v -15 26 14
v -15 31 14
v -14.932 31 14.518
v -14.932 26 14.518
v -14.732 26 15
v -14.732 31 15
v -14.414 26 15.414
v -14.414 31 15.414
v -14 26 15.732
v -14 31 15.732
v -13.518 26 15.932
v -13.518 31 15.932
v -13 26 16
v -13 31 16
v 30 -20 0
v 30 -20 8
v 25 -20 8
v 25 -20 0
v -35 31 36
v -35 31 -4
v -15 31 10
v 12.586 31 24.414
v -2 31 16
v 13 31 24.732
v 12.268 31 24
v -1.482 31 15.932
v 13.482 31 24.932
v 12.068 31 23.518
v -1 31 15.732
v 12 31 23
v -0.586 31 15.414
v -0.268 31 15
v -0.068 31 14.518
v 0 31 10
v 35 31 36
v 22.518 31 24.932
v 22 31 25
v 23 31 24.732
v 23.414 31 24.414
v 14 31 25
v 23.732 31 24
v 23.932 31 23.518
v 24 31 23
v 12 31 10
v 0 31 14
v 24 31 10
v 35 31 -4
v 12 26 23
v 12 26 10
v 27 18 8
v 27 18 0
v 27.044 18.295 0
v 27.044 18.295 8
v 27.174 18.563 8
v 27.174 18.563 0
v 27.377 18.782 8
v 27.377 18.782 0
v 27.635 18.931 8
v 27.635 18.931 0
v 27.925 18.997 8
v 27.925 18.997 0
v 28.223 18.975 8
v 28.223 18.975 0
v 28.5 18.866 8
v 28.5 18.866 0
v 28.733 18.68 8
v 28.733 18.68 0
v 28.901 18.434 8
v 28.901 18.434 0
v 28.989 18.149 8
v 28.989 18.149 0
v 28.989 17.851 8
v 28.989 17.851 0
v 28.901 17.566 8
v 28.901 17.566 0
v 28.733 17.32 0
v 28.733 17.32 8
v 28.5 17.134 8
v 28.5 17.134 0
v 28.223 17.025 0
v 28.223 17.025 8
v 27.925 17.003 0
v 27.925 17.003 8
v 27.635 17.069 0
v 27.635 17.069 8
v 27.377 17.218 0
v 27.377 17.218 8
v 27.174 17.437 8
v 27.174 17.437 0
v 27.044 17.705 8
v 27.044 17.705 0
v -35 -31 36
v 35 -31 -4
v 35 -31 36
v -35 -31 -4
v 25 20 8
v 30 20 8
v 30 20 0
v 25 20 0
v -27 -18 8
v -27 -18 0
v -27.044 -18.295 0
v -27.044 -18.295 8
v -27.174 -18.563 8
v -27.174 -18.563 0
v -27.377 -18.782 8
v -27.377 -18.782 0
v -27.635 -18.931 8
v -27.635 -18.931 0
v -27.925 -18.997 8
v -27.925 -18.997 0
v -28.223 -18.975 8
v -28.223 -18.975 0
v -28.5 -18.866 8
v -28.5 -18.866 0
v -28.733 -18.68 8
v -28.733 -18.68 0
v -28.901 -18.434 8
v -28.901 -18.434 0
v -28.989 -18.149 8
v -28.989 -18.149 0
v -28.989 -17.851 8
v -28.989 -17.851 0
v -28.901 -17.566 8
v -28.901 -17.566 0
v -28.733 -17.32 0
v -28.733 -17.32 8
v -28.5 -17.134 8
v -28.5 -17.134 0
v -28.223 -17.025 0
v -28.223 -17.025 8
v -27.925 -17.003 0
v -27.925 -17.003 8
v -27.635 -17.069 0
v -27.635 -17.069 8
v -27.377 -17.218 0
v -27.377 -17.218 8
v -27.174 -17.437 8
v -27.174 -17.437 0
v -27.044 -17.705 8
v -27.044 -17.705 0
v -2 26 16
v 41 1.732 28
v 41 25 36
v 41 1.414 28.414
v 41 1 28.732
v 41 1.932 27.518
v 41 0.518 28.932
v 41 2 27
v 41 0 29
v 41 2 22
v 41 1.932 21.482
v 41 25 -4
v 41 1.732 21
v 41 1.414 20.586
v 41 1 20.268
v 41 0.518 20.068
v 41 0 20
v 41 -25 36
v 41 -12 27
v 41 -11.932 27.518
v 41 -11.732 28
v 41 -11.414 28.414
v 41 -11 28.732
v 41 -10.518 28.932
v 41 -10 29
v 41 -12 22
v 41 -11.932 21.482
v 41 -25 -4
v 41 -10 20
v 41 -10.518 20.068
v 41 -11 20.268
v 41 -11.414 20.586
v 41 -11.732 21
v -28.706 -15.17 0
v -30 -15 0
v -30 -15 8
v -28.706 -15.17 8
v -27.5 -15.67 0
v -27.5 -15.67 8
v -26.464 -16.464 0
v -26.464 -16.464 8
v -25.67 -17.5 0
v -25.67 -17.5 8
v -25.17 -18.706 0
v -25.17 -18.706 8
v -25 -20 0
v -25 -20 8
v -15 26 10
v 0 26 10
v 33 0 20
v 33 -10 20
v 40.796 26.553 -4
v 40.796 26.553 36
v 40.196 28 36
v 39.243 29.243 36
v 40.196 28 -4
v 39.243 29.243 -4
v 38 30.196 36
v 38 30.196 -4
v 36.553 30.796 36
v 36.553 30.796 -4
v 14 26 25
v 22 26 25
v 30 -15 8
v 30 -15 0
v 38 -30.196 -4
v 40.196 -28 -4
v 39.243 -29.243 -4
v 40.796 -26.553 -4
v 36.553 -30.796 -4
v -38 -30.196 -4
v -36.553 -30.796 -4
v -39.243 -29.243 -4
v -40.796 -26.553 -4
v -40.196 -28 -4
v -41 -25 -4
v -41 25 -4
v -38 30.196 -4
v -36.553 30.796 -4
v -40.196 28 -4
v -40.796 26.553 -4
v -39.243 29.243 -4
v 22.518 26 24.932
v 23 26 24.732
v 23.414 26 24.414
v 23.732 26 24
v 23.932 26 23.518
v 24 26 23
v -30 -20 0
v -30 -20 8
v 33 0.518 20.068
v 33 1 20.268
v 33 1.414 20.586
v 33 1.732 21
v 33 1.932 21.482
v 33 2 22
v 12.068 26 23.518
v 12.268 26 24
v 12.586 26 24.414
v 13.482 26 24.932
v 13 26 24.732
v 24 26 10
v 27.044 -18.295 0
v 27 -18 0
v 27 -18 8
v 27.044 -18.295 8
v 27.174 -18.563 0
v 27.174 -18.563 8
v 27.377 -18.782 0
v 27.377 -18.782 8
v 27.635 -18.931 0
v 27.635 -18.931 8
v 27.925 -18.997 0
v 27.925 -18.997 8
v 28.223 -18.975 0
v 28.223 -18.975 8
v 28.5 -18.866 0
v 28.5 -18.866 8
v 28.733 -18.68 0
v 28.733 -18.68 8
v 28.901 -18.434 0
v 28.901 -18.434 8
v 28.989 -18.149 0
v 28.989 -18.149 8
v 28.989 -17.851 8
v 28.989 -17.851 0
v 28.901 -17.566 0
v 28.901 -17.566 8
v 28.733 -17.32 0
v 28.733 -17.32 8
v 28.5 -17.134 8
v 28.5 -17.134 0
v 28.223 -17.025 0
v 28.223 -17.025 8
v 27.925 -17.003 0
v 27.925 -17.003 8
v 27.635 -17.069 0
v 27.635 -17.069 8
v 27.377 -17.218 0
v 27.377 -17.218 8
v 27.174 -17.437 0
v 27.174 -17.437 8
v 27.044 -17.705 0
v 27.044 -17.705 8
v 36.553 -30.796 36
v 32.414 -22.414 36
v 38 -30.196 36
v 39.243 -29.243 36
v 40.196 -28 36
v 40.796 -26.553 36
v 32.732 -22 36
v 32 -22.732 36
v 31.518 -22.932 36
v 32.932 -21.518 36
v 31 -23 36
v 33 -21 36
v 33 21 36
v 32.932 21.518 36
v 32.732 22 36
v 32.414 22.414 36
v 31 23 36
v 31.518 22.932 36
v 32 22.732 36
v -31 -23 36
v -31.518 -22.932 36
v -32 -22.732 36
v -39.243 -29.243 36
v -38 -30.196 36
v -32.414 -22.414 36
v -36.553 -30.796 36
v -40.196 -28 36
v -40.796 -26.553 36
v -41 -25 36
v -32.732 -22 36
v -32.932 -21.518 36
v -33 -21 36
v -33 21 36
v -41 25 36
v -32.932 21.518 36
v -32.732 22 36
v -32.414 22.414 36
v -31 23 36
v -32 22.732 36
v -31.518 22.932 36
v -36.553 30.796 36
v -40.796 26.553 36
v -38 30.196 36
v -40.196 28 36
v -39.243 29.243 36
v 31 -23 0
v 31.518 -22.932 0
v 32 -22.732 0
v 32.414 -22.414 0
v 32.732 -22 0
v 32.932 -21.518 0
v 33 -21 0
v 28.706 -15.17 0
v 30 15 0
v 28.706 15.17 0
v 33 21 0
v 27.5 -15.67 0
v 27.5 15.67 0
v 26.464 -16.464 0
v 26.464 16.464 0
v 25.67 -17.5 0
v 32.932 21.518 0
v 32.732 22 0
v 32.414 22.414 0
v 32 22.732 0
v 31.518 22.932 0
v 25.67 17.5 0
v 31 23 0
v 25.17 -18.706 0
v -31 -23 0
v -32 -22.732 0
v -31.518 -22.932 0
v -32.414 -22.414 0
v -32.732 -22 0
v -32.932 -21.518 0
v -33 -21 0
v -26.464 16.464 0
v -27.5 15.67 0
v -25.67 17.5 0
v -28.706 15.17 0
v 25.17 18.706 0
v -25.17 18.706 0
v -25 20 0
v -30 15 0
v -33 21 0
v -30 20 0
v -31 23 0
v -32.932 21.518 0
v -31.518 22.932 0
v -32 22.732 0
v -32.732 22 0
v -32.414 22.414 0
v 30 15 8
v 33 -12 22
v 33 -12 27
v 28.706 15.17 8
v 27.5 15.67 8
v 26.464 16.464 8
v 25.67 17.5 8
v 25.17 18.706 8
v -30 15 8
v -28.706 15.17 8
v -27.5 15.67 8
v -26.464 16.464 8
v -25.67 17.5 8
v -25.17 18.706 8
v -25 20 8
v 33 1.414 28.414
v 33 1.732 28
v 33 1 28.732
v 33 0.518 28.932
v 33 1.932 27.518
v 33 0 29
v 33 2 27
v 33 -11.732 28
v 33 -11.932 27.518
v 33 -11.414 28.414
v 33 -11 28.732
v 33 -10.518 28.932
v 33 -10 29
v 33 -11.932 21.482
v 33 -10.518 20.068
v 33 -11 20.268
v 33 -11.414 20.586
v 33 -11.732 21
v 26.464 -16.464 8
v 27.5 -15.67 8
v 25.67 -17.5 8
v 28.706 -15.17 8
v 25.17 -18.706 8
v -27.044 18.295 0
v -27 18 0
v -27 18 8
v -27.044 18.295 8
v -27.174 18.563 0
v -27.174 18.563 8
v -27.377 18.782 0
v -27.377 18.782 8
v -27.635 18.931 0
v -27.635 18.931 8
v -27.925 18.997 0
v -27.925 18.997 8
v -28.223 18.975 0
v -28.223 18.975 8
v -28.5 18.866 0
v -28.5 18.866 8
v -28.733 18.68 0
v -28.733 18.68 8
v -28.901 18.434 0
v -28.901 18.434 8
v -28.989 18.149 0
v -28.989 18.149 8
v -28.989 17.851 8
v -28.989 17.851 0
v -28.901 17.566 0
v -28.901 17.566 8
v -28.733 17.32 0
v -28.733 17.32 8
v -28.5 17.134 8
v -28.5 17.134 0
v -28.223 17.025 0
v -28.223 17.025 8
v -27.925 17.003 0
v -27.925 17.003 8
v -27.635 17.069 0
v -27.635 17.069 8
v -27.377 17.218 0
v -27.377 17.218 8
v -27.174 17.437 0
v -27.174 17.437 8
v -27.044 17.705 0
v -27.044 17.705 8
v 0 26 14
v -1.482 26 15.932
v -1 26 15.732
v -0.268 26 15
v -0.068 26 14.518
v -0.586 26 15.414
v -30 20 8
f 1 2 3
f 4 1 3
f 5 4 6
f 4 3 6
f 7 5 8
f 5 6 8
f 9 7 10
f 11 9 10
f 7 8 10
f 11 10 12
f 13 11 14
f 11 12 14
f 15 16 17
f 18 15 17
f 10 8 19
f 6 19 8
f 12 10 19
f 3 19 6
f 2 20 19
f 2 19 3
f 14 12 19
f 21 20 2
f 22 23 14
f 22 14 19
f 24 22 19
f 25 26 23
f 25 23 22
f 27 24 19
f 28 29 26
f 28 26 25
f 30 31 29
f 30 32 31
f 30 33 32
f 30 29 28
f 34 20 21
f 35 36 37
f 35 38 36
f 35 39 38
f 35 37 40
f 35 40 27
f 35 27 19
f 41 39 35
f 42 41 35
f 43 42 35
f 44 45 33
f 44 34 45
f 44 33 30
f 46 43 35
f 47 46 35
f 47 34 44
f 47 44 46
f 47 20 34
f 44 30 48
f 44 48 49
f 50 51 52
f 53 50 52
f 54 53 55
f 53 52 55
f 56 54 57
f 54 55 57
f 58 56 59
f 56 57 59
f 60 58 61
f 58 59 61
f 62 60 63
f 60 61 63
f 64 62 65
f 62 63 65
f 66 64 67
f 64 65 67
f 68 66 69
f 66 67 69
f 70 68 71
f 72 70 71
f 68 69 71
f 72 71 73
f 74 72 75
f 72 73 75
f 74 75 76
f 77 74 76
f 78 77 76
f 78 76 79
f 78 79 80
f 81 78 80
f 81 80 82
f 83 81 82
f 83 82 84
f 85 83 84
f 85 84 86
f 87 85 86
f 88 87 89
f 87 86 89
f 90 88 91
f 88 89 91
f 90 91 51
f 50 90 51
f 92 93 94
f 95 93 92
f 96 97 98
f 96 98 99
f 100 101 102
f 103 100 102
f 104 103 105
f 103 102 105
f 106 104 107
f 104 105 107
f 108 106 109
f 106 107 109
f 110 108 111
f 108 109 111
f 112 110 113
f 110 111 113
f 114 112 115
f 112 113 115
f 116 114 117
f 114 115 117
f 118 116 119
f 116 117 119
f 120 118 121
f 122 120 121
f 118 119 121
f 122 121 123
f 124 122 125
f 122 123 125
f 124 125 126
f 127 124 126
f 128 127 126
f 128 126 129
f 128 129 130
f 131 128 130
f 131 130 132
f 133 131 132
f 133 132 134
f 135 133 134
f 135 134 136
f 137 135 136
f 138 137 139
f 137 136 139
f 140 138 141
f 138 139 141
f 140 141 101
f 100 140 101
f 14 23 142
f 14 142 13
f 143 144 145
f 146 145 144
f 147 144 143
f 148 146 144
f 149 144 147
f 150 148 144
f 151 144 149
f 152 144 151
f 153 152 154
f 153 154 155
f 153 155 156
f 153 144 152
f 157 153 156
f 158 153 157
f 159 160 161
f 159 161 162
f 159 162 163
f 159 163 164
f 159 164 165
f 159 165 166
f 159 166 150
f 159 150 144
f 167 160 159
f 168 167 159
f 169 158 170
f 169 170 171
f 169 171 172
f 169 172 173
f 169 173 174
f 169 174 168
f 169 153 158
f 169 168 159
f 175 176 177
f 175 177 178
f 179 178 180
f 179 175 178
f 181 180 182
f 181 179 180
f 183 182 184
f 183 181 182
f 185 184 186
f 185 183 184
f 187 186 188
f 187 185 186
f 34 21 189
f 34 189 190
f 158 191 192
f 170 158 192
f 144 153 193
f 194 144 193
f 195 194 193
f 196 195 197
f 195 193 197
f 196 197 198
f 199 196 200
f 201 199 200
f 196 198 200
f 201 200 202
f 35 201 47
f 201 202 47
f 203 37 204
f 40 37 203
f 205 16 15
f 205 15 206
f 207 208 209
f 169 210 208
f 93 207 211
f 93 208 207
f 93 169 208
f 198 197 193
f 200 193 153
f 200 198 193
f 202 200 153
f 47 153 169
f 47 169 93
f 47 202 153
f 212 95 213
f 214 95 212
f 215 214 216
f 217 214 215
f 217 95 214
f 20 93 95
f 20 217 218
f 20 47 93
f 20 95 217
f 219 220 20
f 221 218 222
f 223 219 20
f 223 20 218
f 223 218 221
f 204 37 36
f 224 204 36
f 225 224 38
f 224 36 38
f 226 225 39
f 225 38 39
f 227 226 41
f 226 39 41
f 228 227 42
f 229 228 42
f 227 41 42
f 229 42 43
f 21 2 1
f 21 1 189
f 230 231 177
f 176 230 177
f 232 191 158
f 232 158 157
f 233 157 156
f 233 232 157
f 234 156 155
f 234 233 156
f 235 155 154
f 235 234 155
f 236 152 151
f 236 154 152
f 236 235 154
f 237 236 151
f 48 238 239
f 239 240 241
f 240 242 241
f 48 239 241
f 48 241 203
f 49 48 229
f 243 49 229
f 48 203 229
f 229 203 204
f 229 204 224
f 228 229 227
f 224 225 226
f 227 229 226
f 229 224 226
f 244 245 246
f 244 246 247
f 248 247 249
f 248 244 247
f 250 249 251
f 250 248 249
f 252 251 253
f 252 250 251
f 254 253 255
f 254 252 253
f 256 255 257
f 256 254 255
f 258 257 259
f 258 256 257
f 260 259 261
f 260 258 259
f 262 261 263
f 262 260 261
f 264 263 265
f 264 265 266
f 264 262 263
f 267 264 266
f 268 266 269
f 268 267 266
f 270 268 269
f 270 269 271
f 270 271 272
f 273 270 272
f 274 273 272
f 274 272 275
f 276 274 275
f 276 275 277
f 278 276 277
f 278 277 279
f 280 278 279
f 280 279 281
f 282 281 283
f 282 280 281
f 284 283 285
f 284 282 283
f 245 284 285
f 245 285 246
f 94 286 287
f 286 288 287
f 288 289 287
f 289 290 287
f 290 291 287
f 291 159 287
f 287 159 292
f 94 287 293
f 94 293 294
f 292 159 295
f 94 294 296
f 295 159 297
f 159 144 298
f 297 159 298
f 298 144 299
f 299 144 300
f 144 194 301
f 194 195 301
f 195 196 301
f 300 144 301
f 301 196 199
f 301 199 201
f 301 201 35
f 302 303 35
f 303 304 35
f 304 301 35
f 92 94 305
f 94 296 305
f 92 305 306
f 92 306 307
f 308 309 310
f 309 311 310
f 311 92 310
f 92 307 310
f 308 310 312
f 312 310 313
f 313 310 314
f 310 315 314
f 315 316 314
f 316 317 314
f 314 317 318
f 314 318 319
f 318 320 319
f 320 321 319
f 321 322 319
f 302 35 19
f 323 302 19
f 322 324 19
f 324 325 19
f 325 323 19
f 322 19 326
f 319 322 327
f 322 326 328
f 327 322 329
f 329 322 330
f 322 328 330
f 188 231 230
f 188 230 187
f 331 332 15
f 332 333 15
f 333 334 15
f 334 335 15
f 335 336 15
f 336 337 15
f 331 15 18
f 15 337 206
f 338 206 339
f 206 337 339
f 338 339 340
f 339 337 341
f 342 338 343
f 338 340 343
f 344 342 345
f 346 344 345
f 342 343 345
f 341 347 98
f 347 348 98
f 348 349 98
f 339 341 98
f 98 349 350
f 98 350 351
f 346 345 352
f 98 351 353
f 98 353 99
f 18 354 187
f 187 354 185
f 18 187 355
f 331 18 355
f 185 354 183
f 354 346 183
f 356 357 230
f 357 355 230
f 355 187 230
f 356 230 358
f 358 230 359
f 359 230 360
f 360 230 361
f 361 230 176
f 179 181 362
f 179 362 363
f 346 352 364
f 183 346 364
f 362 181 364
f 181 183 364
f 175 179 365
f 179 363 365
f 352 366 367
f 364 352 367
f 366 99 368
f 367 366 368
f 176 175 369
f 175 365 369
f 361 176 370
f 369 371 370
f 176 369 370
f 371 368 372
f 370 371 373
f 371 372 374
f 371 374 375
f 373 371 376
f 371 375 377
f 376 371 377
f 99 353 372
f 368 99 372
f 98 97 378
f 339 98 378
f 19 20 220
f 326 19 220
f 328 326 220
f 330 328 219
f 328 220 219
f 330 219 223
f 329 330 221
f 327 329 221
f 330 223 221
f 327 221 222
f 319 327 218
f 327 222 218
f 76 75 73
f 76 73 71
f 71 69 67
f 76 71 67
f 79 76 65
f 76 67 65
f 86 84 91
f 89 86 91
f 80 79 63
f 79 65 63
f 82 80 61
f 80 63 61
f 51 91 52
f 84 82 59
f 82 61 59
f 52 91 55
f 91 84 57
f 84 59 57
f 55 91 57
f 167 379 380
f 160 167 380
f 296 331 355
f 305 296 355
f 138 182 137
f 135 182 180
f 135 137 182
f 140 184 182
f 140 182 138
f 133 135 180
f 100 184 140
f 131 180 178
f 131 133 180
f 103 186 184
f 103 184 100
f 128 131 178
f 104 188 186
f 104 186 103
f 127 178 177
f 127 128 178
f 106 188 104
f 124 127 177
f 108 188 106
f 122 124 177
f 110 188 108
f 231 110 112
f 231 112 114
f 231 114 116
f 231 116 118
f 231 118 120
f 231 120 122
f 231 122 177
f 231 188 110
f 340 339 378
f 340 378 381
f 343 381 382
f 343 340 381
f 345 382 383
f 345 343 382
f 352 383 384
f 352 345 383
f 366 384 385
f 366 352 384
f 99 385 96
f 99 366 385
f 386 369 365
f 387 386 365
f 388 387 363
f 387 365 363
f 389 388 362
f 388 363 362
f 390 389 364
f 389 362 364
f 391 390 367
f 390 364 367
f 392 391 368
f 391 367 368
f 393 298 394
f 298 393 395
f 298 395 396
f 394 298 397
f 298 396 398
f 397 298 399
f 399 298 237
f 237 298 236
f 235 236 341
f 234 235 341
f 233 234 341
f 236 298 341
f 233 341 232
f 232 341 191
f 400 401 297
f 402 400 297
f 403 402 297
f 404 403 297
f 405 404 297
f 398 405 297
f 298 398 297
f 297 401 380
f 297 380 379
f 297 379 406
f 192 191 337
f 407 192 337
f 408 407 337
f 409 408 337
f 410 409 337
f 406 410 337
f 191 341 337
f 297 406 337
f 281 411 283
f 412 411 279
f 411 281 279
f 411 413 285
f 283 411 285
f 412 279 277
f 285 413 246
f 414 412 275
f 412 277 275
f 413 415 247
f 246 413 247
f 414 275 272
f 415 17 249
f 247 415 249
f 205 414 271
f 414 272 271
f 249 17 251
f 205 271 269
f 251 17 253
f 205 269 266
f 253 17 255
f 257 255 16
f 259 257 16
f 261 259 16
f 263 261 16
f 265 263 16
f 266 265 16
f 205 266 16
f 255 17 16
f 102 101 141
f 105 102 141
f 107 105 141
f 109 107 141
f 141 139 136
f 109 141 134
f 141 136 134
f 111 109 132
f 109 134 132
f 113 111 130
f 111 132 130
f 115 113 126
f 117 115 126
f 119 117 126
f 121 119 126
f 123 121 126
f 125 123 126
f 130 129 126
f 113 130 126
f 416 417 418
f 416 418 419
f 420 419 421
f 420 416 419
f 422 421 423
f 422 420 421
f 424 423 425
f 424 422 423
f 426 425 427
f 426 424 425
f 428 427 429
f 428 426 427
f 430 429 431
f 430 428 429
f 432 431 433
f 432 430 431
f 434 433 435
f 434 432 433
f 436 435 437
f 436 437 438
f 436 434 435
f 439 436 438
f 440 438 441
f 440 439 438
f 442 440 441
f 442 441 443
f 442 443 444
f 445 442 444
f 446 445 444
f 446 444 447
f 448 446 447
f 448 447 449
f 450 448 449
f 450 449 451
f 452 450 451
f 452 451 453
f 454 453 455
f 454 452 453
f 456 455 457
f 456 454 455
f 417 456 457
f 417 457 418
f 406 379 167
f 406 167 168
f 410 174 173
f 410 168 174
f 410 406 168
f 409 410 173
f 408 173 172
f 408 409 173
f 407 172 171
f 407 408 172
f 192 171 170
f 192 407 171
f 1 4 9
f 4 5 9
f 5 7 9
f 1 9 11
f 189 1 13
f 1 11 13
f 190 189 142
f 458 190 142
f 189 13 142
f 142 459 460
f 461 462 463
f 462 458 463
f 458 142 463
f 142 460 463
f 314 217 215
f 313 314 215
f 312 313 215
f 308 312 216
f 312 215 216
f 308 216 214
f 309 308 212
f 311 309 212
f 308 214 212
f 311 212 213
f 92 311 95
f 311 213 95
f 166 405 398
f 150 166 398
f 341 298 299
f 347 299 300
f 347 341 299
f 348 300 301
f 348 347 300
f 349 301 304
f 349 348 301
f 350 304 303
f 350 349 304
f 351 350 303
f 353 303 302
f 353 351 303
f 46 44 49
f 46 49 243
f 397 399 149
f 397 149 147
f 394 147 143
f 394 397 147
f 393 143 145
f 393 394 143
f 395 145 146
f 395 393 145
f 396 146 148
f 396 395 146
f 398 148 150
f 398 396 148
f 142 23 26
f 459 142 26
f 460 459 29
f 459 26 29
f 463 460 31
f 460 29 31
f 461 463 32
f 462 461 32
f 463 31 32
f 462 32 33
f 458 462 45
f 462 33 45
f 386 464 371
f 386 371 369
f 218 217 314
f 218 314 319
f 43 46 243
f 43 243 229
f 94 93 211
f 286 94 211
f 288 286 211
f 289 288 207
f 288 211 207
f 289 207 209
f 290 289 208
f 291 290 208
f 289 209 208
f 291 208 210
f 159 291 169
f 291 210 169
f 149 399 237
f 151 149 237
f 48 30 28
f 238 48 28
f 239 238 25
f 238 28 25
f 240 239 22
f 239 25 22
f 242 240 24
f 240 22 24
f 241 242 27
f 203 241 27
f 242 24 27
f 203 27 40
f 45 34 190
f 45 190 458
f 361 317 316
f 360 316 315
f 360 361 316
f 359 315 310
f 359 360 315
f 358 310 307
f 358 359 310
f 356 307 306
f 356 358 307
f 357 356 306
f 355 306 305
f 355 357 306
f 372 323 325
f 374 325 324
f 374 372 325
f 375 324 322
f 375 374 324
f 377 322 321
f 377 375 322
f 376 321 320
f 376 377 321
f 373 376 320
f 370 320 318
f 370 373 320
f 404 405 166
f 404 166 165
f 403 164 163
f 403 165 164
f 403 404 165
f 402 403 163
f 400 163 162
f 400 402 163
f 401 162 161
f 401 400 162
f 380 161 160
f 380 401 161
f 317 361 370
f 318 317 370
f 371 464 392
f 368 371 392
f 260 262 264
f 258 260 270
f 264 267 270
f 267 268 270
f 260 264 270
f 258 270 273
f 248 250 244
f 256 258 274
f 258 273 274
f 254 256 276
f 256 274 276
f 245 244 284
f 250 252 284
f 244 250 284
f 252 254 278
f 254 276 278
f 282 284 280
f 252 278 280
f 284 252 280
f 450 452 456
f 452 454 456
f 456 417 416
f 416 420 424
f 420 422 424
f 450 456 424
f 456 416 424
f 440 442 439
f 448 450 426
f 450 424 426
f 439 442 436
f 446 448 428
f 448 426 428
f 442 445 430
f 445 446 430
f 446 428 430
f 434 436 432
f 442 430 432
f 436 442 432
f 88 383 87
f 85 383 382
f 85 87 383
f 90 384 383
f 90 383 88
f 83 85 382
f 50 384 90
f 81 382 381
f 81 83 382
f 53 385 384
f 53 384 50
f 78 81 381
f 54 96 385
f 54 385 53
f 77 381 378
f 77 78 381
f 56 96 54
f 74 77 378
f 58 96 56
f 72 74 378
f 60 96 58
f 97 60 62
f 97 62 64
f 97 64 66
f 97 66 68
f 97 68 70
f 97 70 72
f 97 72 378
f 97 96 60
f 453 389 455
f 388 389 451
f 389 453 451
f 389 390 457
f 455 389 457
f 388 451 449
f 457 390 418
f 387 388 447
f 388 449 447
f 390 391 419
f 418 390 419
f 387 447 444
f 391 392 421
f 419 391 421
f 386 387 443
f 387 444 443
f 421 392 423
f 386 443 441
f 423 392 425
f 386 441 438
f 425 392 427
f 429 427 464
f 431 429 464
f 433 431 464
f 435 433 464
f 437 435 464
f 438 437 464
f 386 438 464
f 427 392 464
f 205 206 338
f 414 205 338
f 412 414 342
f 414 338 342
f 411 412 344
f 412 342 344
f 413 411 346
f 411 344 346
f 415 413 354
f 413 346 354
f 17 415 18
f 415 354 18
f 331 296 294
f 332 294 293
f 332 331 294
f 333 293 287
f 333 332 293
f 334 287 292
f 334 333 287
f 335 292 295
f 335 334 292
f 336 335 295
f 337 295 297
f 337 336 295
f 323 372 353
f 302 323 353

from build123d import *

# Parameters (mm, degrees)
PAD_DEPTH               = 40
POCKET_DEPTH            = 36.001
SKETCH002_R             = 1
PAD001_DEPTH            = 8
SKETCH002_MIRRORED_2_R  = 1
PAD001_MIRRORED_2_DEPTH = 8
POCKET001_DEPTH         = 41.001
POCKET002_DEPTH         = 5


with BuildPart() as part:
    # Sketch → Pad (new body)
    with BuildSketch(Plane.XY.offset(-4)):
        with BuildLine():
            Line((-35, 31), (35, 31))
            ThreePointArc((41, 25), (39.242641, 29.242641), (35, 31))
            Line((41, 25), (41, -25))
            ThreePointArc((35, -31), (39.242641, -29.242641), (41, -25))
            Line((35, -31), (-35, -31))
            ThreePointArc((-41, -25), (-39.242641, -29.242641), (-35, -31))
            Line((-41, -25), (-41, 25))
            ThreePointArc((-35, 31), (-39.242641, 29.242641), (-41, 25))
        make_face()
    extrude(amount=PAD_DEPTH)

    # Sketch001 → Pocket (cut, through all)
    with BuildSketch(Plane.XY):
        with BuildLine():
            Line((-31, 23), (31, 23))
            ThreePointArc((33, 21), (32.414214, 22.414214), (31, 23))
            Line((33, 21), (33, -21))
            ThreePointArc((31, -23), (32.414214, -22.414214), (33, -21))
            Line((31, -23), (-31, -23))
            ThreePointArc((-33, -21), (-32.414214, -22.414214), (-31, -23))
            Line((-33, -21), (-33, 21))
            ThreePointArc((-31, 23), (-32.414214, 22.414214), (-33, 21))
        make_face()
    extrude(amount=POCKET_DEPTH, mode=Mode.SUBTRACT)

    # Sketch002 → Pad001 (join)
    with BuildSketch(Plane.XY):
        with BuildLine():
            Line((-30, 20), (-25, 20))
            ThreePointArc((-30, 15), (-26.464466, 16.464466), (-25, 20))
            Line((-30, 20), (-30, 15))
        make_face()
        with Locations((-28, 18)):
            Circle(SKETCH002_R, mode=Mode.SUBTRACT)
    pad001 = extrude(amount=PAD001_DEPTH)

    # Sketch002 Mirrored 2 → Pad001 Mirrored 2 (add)
    with BuildSketch(Plane(origin=(0, 0, 0), x_dir=(-1, 0, 0), z_dir=(0, 0, -1))):
        with BuildLine():
            Line((-30, 20), (-25, 20))
            ThreePointArc((-30, 15), (-26.464466, 16.464466), (-25, 20))
            Line((-30, 20), (-30, 15))
        make_face()
        with Locations((-28, 18)):
            Circle(SKETCH002_MIRRORED_2_R, mode=Mode.SUBTRACT)
    pad001_mirrored_2 = extrude(amount=-PAD001_MIRRORED_2_DEPTH)

    # Mirrored001: Pad001, Pad001 Mirrored 2 across Sketch002 H_Axis
    add(pad001.mirror(Plane.ZX))
    add(pad001_mirrored_2.mirror(Plane.ZX))

    # Sketch003 → Pocket001 (cut, through all)
    with BuildSketch(Plane.YZ):
        with BuildLine():
            Line((0, 20), (-10, 20))
            ThreePointArc((-12, 22), (-11.414214, 20.585786), (-10, 20))
            Line((-12, 22), (-12, 27))
            ThreePointArc((-10, 29), (-11.414214, 28.414214), (-12, 27))
            Line((-10, 29), (0, 29))
            ThreePointArc((2, 27), (1.414214, 28.414214), (0, 29))
            Line((2, 27), (2, 22))
            ThreePointArc((0, 20), (1.414214, 20.585786), (2, 22))
        make_face()
    extrude(amount=POCKET001_DEPTH, mode=Mode.SUBTRACT)

    # Sketch004 (on Face7 of Pocket001) → Pocket002 (cut)
    with BuildSketch(Plane(origin=(0, 31, 0), x_dir=(-1, 0, 0), z_dir=(0, 1, 0))):
        with BuildLine():
            Line((-22, 25), (-14, 25))
            ThreePointArc((-12, 23), (-12.585786, 24.414214), (-14, 25))
            Line((-12, 23), (-12, 10))
            Line((-12, 10), (-24, 10))
            Line((-24, 10), (-24, 23))
            ThreePointArc((-22, 25), (-23.414214, 24.414214), (-24, 23))
        make_face()
        with BuildLine():
            Line((2, 16), (13, 16))
            ThreePointArc((15, 14), (14.414214, 15.414214), (13, 16))
            Line((15, 14), (15, 10))
            Line((15, 10), (0, 10))
            Line((0, 10), (0, 14))
            ThreePointArc((2, 16), (0.585786, 15.414214), (0, 14))
        make_face()
    extrude(amount=-POCKET002_DEPTH, mode=Mode.SUBTRACT)


solid = part.part
